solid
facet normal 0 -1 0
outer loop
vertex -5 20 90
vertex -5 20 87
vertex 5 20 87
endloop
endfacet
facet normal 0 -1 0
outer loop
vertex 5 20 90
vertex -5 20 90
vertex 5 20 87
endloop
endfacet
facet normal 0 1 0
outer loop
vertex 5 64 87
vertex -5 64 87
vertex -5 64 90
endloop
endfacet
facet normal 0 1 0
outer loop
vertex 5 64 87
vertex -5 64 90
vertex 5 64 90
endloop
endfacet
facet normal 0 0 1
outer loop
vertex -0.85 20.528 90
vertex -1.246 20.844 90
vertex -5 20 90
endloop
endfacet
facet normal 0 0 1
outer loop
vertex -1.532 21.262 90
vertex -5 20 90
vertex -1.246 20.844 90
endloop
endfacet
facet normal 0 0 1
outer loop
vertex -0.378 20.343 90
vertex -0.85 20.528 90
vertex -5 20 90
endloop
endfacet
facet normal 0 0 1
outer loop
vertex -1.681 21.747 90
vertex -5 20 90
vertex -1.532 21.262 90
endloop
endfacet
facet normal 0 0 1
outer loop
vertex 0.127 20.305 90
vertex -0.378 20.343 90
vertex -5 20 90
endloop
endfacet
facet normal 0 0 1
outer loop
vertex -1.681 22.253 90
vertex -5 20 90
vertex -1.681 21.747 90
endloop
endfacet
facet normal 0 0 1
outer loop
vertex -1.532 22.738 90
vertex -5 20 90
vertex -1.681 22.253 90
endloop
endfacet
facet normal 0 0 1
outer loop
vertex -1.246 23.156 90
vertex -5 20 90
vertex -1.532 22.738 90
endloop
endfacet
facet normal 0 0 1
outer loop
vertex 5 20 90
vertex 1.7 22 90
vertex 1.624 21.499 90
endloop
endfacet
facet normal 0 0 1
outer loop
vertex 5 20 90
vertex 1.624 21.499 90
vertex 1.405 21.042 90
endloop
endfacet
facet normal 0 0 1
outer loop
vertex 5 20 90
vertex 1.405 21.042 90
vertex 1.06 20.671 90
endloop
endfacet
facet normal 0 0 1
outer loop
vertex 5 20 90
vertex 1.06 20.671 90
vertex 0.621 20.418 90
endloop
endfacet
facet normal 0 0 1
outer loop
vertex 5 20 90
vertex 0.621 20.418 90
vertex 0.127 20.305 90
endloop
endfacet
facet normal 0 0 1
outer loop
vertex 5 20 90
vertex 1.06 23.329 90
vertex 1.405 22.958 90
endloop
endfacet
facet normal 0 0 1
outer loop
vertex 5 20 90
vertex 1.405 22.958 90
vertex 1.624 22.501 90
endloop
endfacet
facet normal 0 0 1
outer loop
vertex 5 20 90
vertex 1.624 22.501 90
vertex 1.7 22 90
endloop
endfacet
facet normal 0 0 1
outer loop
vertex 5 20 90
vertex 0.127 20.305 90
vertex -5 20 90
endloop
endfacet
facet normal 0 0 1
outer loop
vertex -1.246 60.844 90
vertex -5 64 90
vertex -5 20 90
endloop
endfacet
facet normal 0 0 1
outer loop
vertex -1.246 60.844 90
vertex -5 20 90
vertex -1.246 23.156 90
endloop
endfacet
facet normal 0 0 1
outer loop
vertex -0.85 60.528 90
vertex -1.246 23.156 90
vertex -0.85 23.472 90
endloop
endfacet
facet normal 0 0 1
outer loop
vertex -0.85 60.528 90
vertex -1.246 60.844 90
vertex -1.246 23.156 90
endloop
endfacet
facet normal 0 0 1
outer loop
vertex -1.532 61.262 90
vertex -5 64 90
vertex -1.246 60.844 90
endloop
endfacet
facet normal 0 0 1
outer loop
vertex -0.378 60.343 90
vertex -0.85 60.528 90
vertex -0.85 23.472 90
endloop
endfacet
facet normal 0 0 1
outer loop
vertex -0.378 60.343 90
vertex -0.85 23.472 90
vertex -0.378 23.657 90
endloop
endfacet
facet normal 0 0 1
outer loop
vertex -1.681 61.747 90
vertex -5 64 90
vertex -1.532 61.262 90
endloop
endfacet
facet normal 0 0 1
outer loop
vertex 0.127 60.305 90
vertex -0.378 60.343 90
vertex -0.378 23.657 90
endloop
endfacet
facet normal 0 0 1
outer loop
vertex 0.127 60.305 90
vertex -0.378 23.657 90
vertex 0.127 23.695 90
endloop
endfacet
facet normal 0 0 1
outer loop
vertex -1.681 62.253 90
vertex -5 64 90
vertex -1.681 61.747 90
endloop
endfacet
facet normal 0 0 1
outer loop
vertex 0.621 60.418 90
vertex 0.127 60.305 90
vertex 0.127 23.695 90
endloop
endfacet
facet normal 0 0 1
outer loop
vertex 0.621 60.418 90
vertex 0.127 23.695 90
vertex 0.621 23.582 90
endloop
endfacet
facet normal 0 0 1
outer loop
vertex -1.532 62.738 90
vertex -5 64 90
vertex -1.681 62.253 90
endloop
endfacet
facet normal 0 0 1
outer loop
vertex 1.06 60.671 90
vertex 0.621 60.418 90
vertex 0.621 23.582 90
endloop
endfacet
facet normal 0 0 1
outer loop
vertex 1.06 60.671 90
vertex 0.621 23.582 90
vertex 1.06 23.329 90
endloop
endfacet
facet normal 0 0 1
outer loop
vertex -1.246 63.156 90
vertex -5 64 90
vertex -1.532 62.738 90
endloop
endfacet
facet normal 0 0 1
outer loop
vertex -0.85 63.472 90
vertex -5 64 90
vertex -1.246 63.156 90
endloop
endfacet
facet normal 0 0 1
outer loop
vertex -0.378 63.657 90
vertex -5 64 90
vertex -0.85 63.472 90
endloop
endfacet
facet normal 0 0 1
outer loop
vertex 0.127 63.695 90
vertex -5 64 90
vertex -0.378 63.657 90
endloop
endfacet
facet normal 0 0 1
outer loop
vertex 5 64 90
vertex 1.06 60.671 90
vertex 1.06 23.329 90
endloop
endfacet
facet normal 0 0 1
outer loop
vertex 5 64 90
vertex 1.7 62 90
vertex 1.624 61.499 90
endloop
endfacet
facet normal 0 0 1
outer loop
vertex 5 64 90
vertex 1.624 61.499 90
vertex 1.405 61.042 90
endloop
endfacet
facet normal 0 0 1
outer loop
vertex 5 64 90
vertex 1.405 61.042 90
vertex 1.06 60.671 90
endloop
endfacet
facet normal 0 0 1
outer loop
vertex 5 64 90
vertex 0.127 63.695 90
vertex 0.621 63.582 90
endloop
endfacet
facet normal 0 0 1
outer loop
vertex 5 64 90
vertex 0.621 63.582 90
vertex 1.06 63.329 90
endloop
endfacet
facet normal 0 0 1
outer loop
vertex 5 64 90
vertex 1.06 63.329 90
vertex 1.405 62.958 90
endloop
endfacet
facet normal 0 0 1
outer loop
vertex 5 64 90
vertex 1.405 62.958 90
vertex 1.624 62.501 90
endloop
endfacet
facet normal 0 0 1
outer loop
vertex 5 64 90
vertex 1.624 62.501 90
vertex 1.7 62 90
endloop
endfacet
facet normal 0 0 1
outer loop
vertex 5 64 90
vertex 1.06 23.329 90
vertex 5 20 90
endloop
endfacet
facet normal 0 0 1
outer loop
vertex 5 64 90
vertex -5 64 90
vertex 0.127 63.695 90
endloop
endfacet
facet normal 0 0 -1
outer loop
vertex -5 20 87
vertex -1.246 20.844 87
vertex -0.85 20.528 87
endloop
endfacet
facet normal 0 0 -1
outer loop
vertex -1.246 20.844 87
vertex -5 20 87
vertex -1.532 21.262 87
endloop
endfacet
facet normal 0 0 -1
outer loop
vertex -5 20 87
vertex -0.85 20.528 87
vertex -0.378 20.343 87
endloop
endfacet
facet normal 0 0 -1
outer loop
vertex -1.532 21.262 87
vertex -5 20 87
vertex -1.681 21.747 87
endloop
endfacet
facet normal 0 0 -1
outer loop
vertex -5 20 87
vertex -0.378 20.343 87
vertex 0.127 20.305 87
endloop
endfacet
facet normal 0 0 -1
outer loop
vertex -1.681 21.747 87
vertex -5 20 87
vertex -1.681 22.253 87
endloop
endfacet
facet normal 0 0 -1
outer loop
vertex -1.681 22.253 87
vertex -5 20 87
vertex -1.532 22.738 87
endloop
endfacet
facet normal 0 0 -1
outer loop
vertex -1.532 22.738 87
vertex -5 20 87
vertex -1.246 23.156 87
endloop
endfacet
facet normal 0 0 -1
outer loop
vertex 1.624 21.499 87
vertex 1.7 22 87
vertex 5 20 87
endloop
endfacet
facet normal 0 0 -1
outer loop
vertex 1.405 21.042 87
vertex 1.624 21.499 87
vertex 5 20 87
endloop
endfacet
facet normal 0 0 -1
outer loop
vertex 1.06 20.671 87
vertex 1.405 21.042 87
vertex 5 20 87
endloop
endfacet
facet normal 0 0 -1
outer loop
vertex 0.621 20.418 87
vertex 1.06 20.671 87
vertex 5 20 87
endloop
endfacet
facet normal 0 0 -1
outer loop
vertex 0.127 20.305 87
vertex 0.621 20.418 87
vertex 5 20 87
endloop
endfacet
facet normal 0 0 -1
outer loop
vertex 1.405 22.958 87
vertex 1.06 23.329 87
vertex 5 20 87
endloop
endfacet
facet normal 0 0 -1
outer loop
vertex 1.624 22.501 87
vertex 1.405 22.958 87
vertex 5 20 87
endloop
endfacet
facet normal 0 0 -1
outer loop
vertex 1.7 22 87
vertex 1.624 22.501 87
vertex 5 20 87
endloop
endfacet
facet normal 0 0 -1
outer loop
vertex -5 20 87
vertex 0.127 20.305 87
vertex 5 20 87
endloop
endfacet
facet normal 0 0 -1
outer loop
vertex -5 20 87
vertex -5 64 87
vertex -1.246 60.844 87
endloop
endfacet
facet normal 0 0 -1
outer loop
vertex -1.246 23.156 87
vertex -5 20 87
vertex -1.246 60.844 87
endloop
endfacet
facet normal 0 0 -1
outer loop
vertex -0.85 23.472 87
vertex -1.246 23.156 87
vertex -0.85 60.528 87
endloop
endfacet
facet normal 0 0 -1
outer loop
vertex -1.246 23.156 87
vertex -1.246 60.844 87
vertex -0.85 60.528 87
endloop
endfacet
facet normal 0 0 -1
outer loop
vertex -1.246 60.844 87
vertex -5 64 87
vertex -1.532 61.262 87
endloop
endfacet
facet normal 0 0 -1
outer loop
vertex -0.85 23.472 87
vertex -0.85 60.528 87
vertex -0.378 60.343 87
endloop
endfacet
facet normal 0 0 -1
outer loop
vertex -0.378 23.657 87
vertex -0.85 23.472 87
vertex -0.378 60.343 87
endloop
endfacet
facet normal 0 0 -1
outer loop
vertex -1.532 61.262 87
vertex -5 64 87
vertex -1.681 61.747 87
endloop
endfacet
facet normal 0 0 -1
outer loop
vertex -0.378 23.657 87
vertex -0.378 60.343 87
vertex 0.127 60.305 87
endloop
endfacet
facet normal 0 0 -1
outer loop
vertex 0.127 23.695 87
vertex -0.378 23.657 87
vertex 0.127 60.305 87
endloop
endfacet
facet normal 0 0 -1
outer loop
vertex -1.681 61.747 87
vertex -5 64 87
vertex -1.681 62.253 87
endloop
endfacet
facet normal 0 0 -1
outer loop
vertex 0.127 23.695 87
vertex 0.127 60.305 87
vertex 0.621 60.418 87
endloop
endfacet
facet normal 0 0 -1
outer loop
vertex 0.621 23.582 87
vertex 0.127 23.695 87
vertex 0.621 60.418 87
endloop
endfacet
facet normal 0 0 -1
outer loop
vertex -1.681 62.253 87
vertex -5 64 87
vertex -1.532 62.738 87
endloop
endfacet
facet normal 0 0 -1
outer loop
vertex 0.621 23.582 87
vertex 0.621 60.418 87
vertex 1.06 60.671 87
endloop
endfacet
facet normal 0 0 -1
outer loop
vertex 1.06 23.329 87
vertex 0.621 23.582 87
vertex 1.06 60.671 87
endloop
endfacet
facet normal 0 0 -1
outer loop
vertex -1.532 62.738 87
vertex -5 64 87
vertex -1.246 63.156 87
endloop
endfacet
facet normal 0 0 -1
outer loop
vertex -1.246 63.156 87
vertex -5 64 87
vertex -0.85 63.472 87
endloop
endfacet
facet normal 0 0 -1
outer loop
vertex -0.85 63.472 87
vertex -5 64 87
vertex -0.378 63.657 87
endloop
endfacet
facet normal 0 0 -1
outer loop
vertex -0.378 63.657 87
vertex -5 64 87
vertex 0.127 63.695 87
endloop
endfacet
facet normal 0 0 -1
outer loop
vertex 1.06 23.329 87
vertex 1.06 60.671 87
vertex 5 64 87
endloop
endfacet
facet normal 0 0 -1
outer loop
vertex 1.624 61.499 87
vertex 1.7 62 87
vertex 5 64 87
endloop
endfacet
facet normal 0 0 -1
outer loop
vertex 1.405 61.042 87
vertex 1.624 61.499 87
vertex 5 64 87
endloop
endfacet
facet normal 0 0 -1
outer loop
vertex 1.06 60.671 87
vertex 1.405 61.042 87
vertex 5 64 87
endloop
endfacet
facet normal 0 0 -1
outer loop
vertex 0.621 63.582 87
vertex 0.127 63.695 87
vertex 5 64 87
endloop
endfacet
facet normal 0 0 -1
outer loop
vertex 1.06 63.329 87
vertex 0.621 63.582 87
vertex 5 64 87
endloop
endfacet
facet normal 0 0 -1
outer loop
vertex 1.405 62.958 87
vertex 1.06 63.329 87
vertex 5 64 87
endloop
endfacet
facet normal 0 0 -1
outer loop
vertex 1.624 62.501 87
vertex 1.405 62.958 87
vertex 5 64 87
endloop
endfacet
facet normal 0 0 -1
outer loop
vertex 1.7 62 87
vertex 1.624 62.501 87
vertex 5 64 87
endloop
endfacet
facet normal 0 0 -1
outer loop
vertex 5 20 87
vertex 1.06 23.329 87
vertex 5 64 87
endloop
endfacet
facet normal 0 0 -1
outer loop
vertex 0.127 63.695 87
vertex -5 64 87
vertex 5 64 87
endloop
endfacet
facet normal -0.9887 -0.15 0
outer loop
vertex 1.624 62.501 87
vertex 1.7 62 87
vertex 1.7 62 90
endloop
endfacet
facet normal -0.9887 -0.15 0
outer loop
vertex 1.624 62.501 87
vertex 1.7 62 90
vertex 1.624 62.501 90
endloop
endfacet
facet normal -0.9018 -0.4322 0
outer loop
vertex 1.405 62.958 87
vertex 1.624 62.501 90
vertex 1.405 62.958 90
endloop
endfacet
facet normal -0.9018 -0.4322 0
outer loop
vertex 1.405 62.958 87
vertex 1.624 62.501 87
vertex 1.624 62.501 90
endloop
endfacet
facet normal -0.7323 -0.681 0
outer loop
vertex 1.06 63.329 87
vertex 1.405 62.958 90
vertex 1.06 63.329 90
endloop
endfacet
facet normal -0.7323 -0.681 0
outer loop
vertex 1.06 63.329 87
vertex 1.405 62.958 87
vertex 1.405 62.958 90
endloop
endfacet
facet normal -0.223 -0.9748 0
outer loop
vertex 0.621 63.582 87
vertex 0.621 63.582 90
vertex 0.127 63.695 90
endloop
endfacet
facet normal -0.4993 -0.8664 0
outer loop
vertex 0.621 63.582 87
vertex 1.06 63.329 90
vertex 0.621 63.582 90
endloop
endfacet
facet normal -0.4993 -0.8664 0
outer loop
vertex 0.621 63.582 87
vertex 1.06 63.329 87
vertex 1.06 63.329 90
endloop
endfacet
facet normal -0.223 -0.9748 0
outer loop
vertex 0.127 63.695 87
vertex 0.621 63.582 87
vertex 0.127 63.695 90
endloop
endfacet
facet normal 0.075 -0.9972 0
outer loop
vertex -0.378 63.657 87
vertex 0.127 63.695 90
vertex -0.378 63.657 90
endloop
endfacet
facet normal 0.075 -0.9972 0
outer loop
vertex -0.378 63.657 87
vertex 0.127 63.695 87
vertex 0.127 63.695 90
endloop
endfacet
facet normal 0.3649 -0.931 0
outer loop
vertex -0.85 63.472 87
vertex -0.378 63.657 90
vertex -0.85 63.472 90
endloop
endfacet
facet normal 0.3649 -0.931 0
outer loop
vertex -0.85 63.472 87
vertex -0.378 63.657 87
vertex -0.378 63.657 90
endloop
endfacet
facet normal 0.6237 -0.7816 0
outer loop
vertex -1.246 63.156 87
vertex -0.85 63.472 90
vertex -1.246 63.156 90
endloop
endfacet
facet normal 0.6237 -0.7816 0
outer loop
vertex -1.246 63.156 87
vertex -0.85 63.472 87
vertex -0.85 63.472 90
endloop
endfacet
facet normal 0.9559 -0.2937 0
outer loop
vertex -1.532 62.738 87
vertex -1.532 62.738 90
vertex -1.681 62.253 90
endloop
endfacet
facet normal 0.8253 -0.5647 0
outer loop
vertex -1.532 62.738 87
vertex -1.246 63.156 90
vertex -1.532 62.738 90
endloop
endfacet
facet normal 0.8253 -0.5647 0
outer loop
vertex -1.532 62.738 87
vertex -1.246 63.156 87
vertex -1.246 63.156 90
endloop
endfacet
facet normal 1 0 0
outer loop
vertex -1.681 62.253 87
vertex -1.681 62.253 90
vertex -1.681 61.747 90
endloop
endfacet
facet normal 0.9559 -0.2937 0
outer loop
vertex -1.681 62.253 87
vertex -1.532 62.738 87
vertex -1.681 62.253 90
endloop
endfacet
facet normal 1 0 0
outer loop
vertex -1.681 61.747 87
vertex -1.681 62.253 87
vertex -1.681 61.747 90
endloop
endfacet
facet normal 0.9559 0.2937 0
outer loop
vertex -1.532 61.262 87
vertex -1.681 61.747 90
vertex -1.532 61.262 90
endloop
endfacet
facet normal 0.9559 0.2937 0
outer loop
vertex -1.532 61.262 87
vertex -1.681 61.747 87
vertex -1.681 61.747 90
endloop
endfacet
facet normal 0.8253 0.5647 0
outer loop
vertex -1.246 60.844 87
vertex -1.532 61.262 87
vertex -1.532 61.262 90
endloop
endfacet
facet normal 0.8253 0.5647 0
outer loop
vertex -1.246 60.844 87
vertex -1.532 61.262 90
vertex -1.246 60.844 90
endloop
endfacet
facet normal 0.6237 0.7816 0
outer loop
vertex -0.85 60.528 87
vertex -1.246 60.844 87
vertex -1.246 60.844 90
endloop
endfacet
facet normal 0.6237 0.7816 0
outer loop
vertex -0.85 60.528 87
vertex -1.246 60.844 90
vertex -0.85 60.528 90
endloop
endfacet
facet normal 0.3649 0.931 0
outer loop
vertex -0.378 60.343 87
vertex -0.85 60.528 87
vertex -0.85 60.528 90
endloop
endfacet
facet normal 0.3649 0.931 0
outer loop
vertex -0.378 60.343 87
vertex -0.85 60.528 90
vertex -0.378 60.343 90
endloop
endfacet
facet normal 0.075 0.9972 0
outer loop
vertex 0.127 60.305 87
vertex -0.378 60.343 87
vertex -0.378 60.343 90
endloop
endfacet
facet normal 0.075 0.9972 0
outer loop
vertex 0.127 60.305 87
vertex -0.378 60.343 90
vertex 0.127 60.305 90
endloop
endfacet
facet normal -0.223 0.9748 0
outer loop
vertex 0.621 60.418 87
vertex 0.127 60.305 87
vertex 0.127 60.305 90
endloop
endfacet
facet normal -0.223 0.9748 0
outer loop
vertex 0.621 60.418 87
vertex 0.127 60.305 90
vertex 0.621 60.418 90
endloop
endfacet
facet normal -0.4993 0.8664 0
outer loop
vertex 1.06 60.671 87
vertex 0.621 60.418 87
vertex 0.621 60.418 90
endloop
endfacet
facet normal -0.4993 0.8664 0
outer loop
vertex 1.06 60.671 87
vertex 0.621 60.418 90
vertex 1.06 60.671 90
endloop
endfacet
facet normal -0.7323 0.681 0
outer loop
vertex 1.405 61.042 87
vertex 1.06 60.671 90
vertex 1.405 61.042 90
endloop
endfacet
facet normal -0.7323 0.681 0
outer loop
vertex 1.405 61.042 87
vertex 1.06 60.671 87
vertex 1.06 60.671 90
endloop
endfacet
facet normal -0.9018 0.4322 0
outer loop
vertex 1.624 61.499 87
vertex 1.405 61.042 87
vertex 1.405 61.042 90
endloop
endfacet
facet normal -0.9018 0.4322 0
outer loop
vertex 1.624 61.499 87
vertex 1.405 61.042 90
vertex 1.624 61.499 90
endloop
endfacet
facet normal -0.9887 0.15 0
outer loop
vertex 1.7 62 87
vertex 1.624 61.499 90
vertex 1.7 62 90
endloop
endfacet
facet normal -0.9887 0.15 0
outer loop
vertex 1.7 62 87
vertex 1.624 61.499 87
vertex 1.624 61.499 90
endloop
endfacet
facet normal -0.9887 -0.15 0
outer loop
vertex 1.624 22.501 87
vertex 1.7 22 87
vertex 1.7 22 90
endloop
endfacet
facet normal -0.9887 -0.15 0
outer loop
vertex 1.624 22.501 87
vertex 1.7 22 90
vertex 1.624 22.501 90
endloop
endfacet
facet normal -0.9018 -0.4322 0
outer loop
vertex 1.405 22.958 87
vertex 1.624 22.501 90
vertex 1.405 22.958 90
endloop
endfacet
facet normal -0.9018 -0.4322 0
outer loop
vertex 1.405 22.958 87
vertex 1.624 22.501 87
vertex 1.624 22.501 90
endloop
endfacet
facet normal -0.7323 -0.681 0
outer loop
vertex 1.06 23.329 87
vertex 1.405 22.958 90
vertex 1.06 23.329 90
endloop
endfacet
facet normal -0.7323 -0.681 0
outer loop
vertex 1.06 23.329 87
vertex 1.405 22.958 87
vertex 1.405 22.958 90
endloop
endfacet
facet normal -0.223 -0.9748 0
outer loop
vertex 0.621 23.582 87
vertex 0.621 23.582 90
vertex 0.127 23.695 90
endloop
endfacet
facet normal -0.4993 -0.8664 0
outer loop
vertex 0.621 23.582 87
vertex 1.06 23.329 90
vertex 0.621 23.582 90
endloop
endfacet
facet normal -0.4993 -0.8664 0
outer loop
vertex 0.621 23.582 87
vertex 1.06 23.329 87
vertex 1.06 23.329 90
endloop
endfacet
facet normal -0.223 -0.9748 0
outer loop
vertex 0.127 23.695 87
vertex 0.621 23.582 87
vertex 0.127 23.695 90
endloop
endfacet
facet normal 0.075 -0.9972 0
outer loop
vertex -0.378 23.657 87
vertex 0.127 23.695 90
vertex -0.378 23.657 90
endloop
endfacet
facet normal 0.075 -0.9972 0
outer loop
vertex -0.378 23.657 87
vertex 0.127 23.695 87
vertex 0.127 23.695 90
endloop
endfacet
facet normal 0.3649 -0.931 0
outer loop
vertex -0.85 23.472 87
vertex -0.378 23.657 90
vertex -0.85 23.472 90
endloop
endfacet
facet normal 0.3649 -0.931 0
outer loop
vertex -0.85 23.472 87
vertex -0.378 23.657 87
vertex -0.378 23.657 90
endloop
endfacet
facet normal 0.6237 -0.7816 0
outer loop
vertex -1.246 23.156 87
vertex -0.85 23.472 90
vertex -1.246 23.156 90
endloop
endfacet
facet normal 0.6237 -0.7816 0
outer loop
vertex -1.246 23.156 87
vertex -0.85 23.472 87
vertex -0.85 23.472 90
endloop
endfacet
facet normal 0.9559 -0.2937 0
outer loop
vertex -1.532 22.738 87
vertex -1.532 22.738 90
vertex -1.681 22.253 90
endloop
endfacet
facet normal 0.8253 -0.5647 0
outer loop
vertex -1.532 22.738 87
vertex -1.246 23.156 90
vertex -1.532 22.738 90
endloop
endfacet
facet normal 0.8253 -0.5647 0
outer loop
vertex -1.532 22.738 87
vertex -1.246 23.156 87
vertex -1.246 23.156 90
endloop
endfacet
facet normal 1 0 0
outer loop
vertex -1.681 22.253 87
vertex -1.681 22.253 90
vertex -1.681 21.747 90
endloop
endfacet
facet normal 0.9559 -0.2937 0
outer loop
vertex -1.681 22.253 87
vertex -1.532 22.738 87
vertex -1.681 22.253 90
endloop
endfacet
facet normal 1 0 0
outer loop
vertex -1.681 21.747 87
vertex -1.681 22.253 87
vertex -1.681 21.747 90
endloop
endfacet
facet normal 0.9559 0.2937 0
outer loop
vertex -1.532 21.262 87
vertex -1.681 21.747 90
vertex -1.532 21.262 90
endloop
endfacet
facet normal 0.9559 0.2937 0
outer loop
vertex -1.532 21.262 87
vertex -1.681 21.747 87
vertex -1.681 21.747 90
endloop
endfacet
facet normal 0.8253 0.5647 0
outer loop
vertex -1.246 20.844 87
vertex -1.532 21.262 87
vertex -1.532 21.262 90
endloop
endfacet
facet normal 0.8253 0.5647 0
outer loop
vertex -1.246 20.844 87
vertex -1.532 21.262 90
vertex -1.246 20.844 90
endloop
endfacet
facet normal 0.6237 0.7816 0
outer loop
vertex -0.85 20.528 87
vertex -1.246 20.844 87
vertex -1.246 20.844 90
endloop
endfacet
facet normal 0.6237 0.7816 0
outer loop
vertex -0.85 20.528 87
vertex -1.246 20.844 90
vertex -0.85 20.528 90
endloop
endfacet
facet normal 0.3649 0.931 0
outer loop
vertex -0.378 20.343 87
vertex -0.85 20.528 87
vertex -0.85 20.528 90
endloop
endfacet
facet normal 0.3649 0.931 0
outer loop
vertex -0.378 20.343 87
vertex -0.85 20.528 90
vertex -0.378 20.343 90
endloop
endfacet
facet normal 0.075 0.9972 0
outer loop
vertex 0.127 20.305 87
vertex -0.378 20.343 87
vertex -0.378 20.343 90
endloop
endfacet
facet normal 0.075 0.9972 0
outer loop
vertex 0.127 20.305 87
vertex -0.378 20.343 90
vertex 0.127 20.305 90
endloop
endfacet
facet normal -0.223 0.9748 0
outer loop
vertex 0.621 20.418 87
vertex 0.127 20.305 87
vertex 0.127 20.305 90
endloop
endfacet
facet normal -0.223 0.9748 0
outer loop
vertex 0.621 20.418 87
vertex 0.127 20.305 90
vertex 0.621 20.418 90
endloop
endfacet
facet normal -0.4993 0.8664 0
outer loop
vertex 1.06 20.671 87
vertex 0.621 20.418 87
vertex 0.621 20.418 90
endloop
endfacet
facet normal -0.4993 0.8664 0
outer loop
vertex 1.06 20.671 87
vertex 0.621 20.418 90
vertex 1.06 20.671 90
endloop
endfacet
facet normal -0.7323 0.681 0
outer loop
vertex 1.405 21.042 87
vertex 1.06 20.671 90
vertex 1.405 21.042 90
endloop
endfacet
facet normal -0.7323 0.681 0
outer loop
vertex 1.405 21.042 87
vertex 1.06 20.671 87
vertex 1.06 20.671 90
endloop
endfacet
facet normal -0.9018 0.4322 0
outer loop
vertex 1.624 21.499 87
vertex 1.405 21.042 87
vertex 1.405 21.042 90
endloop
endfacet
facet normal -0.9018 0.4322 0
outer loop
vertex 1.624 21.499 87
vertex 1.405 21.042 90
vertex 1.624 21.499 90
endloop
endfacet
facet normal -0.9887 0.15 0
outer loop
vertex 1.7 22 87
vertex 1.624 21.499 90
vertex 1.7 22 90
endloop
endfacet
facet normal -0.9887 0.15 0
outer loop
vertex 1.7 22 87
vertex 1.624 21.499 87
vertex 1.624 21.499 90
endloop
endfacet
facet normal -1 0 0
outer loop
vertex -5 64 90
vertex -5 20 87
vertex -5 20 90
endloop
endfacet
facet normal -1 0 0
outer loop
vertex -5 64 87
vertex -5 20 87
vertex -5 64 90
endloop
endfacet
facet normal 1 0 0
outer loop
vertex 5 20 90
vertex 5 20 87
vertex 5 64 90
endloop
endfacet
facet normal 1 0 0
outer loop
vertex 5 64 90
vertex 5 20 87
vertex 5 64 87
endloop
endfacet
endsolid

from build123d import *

# Parameters (mm, degrees)
SKETCH1_W      = 10
SKETCH1_H      = 44
BAR_DEPTH      = 3
SKETCH2_R      = 1.7
M3_HOLES_DEPTH = 5


with BuildPart() as part:
    # Sketch1 → Bar (new body)
    with BuildSketch(Plane.XY.offset(87)):
        with Locations((0, 42)):
            Rectangle(SKETCH1_W, SKETCH1_H)
    extrude(amount=BAR_DEPTH)

    # Sketch2 → M3_holes (cut)
    with BuildSketch(Plane.XY.offset(86)):
        with Locations((0, 62)):
            Circle(SKETCH2_R)
        with Locations((0, 22)):
            Circle(SKETCH2_R)
    extrude(amount=M3_HOLES_DEPTH, mode=Mode.SUBTRACT)


solid = part.part
